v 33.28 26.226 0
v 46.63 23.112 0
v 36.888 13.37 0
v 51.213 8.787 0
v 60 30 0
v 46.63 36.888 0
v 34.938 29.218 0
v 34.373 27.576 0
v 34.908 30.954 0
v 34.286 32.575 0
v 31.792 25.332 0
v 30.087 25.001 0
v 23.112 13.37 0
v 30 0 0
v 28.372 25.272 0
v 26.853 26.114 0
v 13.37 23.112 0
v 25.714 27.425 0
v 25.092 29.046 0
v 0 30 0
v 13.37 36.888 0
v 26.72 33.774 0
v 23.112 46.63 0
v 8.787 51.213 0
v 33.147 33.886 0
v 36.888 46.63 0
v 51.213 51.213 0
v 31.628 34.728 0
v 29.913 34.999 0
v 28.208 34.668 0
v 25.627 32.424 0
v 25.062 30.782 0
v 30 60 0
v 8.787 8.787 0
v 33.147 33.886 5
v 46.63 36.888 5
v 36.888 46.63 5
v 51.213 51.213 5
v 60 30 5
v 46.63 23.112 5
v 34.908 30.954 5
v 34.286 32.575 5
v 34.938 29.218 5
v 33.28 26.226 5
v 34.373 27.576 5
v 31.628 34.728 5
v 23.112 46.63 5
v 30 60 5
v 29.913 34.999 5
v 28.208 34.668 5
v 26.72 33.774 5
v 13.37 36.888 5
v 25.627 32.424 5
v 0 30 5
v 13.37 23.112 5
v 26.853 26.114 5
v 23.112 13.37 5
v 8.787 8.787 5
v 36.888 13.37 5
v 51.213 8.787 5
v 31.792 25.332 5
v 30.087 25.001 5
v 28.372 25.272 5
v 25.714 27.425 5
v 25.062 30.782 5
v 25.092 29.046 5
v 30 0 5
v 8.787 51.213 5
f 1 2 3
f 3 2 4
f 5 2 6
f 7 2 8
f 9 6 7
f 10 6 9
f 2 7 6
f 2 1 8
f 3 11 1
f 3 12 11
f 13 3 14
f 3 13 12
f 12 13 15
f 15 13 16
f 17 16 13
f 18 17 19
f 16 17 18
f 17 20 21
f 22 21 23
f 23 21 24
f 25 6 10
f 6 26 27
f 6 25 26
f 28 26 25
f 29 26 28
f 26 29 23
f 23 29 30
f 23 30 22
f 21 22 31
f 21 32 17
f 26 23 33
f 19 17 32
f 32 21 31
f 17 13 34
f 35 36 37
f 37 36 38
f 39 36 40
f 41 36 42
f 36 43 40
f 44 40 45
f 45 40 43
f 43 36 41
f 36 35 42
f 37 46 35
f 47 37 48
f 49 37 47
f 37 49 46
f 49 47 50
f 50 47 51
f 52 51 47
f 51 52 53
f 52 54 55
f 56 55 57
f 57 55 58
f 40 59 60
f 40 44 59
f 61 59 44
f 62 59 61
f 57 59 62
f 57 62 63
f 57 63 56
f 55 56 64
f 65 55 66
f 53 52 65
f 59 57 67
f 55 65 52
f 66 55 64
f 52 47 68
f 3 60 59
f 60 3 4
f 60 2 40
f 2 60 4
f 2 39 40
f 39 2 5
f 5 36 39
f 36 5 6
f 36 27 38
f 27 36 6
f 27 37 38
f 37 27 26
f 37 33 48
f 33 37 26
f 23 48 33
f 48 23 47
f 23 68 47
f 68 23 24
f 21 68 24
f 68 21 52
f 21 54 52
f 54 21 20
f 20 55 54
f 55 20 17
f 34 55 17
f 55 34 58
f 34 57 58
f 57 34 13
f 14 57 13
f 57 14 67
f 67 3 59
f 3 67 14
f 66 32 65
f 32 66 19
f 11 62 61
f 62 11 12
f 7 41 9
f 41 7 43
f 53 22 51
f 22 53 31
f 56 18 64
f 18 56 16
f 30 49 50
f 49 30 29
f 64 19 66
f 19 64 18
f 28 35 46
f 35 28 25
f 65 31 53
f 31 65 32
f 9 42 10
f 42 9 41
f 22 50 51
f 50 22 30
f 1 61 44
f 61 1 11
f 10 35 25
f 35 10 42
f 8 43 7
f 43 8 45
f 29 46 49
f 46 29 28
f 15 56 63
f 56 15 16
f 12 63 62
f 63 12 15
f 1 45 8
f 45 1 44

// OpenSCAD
$fn = 32;

// ----------------------------------------------------------------------
// Star wheel: 8-point blunt, R30
// ----------------------------------------------------------------------

// --- parameters (mm) ---
n_points = 8;             // number of points / teeth
r_out = 30;               // tip radius
r_in = 18;                // root radius
bore_r = 5;               // centre bore radius
plate_t = 5;              // plate thickness, Z (extrusion height)
bore_d = 10;              // centre bore diameter

profile = [[60, 30], [46.63, 36.888], [51.213, 51.213], [36.888, 46.63], [30, 60], [23.112, 46.63], [8.787, 51.213], [13.37, 36.888], [0, 30], [13.37, 23.112], [8.787, 8.787], [23.112, 13.37], [30, 0], [36.888, 13.37], [51.213, 8.787], [46.63, 23.112]];  // primary outline, 16 points, counter clockwise
void_1 = [[34.908, 30.954], [34.286, 32.575], [33.147, 33.886], [31.628, 34.728], [29.913, 34.999], [28.208, 34.668], [26.72, 33.774], [25.627, 32.424], [25.062, 30.782], [25.092, 29.046], [25.714, 27.425], [26.853, 26.114], [28.372, 25.272], [30.087, 25.001], [31.792, 25.332], [33.28, 26.226], [34.373, 27.576], [34.938, 29.218]];  // centre bore, 18 points

// --- the one profile operation ---
difference() {
  linear_extrude(height = plate_t) polygon(points = profile);
  translate([0, 0, -1])
    linear_extrude(height = plate_t + 2) polygon(points = void_1);
}
